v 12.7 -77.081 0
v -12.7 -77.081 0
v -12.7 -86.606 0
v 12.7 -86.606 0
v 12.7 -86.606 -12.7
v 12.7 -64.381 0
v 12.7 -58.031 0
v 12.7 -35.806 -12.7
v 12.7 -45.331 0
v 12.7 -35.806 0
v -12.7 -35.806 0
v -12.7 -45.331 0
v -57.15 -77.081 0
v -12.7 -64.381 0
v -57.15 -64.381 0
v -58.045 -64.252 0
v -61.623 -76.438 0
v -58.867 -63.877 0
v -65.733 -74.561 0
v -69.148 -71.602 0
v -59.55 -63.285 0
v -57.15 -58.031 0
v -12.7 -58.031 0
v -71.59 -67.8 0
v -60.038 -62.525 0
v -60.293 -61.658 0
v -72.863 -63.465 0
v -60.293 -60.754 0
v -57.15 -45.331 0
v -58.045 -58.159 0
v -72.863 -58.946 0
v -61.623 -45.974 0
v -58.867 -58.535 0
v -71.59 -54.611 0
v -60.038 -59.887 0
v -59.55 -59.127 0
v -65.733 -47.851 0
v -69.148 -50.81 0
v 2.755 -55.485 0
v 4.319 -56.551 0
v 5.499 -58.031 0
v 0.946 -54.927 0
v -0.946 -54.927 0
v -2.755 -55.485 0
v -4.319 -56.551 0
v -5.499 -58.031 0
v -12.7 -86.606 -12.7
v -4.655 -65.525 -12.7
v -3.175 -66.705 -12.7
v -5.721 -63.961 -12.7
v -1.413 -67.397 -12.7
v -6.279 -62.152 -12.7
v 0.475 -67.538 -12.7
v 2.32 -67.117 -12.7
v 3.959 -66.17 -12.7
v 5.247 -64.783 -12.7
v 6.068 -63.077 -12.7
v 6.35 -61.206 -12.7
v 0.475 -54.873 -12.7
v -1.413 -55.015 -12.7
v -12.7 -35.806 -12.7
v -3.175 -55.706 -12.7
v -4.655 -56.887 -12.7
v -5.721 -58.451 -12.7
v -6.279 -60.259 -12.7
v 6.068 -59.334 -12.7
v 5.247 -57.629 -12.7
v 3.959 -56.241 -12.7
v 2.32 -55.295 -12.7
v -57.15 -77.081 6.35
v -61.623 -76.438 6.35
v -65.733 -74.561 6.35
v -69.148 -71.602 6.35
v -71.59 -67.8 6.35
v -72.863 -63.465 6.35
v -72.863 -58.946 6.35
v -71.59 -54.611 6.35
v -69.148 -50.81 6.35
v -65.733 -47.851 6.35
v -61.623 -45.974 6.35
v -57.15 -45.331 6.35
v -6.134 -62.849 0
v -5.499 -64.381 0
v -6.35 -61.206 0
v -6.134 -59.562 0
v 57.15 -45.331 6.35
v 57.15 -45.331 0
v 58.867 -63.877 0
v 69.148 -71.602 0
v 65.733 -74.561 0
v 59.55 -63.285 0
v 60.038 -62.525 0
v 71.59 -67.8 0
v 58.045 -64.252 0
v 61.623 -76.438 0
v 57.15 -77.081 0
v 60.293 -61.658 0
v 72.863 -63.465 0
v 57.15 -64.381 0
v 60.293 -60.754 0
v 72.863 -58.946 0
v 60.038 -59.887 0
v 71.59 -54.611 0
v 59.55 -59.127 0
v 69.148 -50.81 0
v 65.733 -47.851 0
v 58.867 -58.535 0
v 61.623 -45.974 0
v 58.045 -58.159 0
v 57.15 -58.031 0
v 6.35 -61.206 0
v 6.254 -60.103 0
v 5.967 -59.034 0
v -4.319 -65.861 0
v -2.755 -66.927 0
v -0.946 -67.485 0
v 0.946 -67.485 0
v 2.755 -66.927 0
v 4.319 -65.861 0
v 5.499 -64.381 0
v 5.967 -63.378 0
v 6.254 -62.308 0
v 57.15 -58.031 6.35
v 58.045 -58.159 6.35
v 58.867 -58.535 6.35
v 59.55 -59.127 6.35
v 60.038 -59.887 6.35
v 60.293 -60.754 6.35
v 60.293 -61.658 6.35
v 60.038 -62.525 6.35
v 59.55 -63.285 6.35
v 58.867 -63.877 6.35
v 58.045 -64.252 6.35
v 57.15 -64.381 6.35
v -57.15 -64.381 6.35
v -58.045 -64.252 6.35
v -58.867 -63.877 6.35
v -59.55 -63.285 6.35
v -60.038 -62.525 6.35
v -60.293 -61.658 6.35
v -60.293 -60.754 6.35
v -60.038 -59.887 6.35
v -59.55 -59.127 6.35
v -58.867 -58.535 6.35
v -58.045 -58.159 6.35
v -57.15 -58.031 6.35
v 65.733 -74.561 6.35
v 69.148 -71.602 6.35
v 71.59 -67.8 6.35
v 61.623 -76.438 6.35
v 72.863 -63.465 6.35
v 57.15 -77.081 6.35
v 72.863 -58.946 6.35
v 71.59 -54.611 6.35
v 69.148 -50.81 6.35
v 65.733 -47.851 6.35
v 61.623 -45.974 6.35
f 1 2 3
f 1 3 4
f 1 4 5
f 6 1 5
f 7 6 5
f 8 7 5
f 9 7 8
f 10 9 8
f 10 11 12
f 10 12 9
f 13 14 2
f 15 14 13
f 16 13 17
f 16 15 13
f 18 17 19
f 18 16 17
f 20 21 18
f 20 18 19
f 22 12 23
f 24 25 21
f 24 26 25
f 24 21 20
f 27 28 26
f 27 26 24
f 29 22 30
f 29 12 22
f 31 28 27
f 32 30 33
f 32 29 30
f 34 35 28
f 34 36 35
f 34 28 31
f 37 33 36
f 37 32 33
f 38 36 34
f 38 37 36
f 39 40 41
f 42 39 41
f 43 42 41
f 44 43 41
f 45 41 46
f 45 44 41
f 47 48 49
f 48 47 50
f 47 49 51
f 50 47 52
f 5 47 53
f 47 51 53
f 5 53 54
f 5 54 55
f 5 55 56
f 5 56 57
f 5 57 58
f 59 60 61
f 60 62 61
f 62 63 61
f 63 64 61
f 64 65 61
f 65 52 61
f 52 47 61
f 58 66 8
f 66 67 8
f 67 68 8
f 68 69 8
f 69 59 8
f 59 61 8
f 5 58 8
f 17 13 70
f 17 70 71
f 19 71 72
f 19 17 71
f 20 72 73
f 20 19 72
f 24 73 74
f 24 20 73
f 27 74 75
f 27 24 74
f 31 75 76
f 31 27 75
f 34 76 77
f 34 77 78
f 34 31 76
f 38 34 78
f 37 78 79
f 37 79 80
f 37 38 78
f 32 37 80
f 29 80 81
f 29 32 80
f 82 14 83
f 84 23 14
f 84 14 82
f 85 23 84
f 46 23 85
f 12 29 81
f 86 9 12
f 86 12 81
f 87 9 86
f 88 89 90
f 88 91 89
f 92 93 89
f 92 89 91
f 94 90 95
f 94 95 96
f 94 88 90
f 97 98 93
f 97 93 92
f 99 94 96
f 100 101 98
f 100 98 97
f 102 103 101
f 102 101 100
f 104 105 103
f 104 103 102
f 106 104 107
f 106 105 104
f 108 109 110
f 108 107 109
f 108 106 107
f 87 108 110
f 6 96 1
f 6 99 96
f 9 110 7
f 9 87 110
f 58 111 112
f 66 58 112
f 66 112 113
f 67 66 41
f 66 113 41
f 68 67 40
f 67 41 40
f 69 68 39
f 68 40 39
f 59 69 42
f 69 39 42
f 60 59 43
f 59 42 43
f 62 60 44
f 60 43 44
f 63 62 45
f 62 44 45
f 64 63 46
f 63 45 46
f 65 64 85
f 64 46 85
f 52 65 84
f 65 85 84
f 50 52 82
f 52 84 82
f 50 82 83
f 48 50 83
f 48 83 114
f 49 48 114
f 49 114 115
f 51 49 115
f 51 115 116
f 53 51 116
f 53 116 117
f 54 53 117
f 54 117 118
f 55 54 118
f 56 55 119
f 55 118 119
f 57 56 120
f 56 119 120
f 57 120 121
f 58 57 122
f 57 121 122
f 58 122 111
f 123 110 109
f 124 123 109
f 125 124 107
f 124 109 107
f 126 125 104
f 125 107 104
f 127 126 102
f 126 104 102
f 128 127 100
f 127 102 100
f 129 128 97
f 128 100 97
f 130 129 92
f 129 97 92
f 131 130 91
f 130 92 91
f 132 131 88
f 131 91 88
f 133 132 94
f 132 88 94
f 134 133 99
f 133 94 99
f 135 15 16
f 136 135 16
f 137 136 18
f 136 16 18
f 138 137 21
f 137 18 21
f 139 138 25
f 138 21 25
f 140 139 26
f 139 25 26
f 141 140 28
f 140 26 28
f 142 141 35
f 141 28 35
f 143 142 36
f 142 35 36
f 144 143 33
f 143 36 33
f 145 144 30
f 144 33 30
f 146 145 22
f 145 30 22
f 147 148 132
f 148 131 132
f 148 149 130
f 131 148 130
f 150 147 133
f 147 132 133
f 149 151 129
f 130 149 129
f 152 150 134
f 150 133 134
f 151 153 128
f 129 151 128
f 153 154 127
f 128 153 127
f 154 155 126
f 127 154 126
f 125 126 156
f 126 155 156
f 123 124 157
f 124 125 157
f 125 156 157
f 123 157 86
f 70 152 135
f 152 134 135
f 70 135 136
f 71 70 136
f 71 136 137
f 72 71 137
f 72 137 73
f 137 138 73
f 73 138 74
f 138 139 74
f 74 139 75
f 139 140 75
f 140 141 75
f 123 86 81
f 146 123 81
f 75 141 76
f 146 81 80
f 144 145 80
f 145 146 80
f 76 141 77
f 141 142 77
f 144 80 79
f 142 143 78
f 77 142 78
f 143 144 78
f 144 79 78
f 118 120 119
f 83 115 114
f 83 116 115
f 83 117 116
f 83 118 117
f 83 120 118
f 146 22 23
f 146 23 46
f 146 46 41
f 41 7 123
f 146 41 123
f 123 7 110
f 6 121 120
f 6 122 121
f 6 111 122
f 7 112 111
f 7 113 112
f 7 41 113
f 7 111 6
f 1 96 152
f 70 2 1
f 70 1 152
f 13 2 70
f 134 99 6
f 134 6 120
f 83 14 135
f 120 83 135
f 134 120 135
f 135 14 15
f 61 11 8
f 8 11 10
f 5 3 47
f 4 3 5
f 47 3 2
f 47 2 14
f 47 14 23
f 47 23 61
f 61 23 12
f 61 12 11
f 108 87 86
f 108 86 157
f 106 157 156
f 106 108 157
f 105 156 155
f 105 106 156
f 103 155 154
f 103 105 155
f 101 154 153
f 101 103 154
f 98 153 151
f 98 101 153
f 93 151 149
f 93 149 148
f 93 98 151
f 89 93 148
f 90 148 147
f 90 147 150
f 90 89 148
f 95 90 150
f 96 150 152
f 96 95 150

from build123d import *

# Parameters (mm, degrees)
SKETCH2_W           = 25.4
SKETCH2_H           = 50.8
SKETCH2_R           = 6.35
BOSS_EXTRUDE1_DEPTH = 12.7
BOSS_EXTRUDE2_DEPTH = 6.35


with BuildPart() as part:
    # Sketch2 → Boss-Extrude1 (new body)
    with BuildSketch(Plane.XY):
        with Locations((0, -61.205719116)):
            Rectangle(SKETCH2_W, SKETCH2_H)
        with Locations((0, -61.205719116)):
            Circle(SKETCH2_R, mode=Mode.SUBTRACT)
    extrude(amount=-BOSS_EXTRUDE1_DEPTH)

    # Sketch3 → Boss-Extrude2 (add)
    with BuildSketch(Plane.XY):
        with BuildLine():
            Line((-57.15, -45.330719116), (57.15, -45.330719116))
            ThreePointArc((57.15, -45.330719116), (73.025, -61.205719116), (57.15, -77.080719116))
            Line((57.15, -77.080719116), (-57.15, -77.080719116))
            ThreePointArc((-57.15, -77.080719116), (-73.025, -61.205719116), (-57.15, -45.330719116))
        make_face()
        with BuildLine():
            Line((-57.15, -58.030719116), (57.15, -58.030719116))
            ThreePointArc((57.15, -58.030719116), (60.325, -61.205719116), (57.15, -64.380719116))
            Line((57.15, -64.380719116), (-57.15, -64.380719116))
            ThreePointArc((-57.15, -64.380719116), (-60.325, -61.205719116), (-57.15, -58.030719116))
        make_face(mode=Mode.SUBTRACT)
    extrude(amount=BOSS_EXTRUDE2_DEPTH)


solid = part.part
